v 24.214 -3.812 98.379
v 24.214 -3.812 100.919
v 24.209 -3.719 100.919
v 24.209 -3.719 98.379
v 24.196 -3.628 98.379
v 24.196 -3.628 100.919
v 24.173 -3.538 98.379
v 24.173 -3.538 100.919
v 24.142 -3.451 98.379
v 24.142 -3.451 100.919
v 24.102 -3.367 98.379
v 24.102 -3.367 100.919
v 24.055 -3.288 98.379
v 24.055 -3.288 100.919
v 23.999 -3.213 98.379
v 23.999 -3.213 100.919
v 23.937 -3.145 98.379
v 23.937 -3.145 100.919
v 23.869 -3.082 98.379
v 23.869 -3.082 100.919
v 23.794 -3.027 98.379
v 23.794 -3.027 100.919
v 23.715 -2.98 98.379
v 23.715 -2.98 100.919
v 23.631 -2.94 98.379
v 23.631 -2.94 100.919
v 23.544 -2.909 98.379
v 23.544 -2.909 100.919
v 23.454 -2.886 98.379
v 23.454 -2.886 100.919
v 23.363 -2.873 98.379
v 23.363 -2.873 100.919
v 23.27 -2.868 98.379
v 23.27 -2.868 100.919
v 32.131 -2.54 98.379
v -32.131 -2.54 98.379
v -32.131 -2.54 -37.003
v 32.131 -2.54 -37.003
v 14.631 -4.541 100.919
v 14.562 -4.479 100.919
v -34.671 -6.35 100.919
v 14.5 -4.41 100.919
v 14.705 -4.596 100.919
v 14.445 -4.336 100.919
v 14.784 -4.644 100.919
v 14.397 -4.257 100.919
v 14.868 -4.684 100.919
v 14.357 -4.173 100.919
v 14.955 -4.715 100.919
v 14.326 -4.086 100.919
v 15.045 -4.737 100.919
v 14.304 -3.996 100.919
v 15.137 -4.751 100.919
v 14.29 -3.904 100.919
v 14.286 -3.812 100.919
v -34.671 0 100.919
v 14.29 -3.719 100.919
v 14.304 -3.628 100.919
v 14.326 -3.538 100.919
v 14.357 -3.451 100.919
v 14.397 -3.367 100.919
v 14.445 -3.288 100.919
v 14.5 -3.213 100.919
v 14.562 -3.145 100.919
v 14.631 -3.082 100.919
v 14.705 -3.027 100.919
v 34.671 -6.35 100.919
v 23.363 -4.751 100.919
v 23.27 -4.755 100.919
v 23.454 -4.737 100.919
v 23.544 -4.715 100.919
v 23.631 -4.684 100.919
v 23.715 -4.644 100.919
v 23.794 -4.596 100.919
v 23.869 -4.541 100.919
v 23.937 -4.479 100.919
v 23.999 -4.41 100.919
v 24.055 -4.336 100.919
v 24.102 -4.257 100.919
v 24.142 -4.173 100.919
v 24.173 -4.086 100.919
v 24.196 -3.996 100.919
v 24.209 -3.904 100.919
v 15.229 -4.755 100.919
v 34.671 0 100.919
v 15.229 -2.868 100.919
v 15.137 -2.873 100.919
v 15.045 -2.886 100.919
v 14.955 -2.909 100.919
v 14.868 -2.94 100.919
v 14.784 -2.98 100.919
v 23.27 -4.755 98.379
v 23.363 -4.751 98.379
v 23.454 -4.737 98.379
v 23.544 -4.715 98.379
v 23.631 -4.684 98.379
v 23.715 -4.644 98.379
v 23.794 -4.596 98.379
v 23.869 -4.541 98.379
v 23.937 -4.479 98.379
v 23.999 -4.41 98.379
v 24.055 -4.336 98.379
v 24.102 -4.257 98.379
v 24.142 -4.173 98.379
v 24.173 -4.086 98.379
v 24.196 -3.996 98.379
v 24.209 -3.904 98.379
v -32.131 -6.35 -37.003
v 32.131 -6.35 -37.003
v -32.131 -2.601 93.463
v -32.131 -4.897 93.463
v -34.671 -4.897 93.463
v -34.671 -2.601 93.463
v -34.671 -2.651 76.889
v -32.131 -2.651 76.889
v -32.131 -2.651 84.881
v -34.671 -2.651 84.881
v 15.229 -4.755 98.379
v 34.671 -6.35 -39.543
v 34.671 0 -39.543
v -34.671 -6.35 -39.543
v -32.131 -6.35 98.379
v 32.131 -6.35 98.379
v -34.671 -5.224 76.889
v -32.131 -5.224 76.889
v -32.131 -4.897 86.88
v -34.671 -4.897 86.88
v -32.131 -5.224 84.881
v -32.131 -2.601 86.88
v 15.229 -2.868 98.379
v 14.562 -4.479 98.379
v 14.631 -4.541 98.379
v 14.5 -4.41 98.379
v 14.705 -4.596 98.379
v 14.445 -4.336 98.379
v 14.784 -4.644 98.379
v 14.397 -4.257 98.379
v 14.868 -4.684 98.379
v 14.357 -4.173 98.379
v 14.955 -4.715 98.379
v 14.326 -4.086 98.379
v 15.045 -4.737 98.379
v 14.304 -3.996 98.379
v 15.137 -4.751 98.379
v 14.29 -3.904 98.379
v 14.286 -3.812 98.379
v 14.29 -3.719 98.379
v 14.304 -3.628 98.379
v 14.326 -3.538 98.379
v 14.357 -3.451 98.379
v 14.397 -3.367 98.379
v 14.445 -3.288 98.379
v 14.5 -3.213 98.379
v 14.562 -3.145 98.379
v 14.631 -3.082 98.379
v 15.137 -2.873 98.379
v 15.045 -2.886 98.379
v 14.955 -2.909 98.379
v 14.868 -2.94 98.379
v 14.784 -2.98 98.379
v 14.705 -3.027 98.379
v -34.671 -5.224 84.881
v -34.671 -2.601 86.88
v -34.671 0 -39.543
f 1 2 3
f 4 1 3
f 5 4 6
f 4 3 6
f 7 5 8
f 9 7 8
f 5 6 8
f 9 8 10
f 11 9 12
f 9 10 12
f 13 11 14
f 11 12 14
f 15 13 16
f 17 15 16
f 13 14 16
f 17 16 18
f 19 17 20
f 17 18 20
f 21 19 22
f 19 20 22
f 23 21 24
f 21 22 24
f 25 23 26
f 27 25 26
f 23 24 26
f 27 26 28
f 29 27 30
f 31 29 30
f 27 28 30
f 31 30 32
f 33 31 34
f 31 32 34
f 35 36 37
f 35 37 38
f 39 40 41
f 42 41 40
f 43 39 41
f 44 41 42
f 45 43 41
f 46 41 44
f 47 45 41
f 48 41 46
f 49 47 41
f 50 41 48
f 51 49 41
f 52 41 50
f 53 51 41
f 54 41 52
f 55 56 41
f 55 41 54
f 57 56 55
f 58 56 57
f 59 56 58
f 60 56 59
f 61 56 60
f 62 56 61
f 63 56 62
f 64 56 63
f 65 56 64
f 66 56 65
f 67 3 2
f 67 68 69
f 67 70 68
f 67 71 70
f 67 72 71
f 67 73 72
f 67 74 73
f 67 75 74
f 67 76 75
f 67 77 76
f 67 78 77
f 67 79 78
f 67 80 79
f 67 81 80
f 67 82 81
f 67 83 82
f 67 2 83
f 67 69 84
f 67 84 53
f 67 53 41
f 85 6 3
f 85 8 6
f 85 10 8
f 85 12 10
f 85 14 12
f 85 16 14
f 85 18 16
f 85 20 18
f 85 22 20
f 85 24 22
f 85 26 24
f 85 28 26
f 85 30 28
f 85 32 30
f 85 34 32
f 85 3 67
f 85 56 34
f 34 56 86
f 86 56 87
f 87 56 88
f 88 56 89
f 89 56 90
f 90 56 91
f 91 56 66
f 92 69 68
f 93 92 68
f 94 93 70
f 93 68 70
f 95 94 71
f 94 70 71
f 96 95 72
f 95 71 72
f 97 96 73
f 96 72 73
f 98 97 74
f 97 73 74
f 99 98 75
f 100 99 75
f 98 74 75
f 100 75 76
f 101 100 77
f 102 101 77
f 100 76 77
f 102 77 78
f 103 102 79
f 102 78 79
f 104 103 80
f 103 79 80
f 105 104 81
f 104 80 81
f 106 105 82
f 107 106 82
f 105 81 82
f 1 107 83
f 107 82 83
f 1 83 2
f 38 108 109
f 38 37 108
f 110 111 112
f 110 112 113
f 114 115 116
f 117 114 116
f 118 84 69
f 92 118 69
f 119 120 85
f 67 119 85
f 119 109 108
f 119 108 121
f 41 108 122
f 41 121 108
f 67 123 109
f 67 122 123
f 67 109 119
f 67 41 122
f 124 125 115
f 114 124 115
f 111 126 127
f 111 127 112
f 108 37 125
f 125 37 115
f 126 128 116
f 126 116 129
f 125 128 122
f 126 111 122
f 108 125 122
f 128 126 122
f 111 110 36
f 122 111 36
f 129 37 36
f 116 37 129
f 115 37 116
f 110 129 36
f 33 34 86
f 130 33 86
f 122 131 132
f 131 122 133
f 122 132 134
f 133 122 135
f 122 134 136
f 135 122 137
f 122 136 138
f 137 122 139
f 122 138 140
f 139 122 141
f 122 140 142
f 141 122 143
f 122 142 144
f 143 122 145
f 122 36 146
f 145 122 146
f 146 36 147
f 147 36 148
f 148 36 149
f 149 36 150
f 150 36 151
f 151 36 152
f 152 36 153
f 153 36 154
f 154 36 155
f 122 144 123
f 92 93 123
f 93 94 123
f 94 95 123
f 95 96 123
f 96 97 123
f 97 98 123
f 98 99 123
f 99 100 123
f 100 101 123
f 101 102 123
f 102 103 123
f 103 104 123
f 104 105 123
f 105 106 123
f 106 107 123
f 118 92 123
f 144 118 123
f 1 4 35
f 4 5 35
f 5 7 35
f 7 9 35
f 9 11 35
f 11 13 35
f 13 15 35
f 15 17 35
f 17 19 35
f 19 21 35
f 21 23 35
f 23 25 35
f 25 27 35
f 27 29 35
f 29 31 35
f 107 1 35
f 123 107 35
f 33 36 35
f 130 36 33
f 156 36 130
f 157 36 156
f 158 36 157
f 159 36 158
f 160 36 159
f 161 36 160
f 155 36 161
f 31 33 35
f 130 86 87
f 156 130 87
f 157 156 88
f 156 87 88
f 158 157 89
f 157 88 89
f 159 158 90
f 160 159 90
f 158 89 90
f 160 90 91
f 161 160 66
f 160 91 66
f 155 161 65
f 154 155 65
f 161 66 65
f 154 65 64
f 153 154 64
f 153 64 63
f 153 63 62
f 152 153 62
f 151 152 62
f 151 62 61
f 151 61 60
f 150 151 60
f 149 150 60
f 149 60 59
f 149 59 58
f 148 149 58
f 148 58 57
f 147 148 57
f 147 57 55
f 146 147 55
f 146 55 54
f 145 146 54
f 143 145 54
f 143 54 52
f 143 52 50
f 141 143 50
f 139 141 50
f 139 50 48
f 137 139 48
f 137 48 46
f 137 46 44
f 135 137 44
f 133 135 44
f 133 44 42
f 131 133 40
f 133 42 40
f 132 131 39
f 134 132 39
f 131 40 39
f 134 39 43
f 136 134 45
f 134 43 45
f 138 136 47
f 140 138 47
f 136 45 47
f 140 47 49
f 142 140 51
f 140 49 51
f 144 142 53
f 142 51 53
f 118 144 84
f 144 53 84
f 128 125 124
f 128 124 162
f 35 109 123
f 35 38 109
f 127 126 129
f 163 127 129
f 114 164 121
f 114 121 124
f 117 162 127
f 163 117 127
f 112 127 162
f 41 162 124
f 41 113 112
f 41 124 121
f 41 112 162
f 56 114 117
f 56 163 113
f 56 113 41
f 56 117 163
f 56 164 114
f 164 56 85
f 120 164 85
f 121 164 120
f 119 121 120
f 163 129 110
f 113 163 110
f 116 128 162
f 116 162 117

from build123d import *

# Parameters (mm, degrees)
F0_W     = 69.342
F0_H     = 140.462
F1_DEPTH = 6.35
F2_T     = -2.54
F4_DEPTH = 25.4
F5_W     = 2.2962929215
F5_H     = 6.5837949514
F5_W_2   = 2.5734174997
F5_H_2   = 7.9922676086
F6_DEPTH = 38.1


with BuildPart() as f1:
    # F0 (on Front) → F1 (new body)
    with BuildSketch(Plane.XZ):
        with Locations((0, 30.688280734)):
            Rectangle(F0_W, F0_H)
    extrude(amount=F1_DEPTH)

    # F2
    f2_openings = [f1.faces().sort_by_distance(p)[0] for p in [
        (0, -6.35, 30.688281),
    ]]
    offset(amount=F2_T, openings=f2_openings)

    # F3 (on face) → F4 (cut)
    with BuildSketch(Plane.XY.offset(100.919280734)):
        with BuildLine():
            ThreePointArc((23.2700649649, -4.7553493267), (22.3264960016, -3.8117803633), (23.2700649649, -2.8682114))
            Line((23.2700649649, -2.8682114), (15.2291525155, -2.8682114))
            ThreePointArc((15.2291525155, -2.8682114), (15.896356528, -3.1445763508), (16.1727214789, -3.8117803633))
            ThreePointArc((16.1727214789, -3.8117803633), (15.896356528, -4.4789843758), (15.2291525155, -4.7553493267))
            Line((15.2291525155, -4.7553493267), (23.2700649649, -4.7553493267))
        make_face()
        with BuildLine():
            ThreePointArc((24.2136339282, -3.8117803633), (23.9372689774, -3.1445763508), (23.2700649649, -2.8682114))
            Line((23.2700649649, -2.8682114), (23.2700649649, -4.7553493267))
            ThreePointArc((23.2700649649, -4.7553493267), (23.9372689774, -4.4789843758), (24.2136339282, -3.8117803633))
        make_face()
        with BuildLine():
            Line((23.2700649649, -4.7553493267), (23.2700649649, -2.8682114))
            ThreePointArc((23.2700649649, -2.8682114), (22.3264960016, -3.8117803633), (23.2700649649, -4.7553493267))
        make_face()
        with BuildLine():
            ThreePointArc((16.1727214789, -3.8117803633), (15.896356528, -3.1445763508), (15.2291525155, -2.8682114))
            Line((15.2291525155, -2.8682114), (15.2291525155, -4.7553493267))
            ThreePointArc((15.2291525155, -4.7553493267), (15.896356528, -4.4789843758), (16.1727214789, -3.8117803633))
        make_face()
        with BuildLine():
            Line((15.2291525155, -4.7553493267), (15.2291525155, -2.8682114))
            ThreePointArc((15.2291525155, -2.8682114), (14.2855835522, -3.8117803633), (15.2291525155, -4.7553493267))
        make_face()
    extrude(amount=-F4_DEPTH, mode=Mode.SUBTRACT)

    # F5 (on Right) → F6 (cut)
    with BuildSketch(Plane.YZ):
        with Locations((-3.7487103837, 90.1714488864)):
            Rectangle(F5_W, F5_H)
        with Locations((-3.9377002977, 80.8853507042)):
            Rectangle(F5_W_2, F5_H_2)
    extrude(amount=-F6_DEPTH, mode=Mode.SUBTRACT)


solid = f1.part
